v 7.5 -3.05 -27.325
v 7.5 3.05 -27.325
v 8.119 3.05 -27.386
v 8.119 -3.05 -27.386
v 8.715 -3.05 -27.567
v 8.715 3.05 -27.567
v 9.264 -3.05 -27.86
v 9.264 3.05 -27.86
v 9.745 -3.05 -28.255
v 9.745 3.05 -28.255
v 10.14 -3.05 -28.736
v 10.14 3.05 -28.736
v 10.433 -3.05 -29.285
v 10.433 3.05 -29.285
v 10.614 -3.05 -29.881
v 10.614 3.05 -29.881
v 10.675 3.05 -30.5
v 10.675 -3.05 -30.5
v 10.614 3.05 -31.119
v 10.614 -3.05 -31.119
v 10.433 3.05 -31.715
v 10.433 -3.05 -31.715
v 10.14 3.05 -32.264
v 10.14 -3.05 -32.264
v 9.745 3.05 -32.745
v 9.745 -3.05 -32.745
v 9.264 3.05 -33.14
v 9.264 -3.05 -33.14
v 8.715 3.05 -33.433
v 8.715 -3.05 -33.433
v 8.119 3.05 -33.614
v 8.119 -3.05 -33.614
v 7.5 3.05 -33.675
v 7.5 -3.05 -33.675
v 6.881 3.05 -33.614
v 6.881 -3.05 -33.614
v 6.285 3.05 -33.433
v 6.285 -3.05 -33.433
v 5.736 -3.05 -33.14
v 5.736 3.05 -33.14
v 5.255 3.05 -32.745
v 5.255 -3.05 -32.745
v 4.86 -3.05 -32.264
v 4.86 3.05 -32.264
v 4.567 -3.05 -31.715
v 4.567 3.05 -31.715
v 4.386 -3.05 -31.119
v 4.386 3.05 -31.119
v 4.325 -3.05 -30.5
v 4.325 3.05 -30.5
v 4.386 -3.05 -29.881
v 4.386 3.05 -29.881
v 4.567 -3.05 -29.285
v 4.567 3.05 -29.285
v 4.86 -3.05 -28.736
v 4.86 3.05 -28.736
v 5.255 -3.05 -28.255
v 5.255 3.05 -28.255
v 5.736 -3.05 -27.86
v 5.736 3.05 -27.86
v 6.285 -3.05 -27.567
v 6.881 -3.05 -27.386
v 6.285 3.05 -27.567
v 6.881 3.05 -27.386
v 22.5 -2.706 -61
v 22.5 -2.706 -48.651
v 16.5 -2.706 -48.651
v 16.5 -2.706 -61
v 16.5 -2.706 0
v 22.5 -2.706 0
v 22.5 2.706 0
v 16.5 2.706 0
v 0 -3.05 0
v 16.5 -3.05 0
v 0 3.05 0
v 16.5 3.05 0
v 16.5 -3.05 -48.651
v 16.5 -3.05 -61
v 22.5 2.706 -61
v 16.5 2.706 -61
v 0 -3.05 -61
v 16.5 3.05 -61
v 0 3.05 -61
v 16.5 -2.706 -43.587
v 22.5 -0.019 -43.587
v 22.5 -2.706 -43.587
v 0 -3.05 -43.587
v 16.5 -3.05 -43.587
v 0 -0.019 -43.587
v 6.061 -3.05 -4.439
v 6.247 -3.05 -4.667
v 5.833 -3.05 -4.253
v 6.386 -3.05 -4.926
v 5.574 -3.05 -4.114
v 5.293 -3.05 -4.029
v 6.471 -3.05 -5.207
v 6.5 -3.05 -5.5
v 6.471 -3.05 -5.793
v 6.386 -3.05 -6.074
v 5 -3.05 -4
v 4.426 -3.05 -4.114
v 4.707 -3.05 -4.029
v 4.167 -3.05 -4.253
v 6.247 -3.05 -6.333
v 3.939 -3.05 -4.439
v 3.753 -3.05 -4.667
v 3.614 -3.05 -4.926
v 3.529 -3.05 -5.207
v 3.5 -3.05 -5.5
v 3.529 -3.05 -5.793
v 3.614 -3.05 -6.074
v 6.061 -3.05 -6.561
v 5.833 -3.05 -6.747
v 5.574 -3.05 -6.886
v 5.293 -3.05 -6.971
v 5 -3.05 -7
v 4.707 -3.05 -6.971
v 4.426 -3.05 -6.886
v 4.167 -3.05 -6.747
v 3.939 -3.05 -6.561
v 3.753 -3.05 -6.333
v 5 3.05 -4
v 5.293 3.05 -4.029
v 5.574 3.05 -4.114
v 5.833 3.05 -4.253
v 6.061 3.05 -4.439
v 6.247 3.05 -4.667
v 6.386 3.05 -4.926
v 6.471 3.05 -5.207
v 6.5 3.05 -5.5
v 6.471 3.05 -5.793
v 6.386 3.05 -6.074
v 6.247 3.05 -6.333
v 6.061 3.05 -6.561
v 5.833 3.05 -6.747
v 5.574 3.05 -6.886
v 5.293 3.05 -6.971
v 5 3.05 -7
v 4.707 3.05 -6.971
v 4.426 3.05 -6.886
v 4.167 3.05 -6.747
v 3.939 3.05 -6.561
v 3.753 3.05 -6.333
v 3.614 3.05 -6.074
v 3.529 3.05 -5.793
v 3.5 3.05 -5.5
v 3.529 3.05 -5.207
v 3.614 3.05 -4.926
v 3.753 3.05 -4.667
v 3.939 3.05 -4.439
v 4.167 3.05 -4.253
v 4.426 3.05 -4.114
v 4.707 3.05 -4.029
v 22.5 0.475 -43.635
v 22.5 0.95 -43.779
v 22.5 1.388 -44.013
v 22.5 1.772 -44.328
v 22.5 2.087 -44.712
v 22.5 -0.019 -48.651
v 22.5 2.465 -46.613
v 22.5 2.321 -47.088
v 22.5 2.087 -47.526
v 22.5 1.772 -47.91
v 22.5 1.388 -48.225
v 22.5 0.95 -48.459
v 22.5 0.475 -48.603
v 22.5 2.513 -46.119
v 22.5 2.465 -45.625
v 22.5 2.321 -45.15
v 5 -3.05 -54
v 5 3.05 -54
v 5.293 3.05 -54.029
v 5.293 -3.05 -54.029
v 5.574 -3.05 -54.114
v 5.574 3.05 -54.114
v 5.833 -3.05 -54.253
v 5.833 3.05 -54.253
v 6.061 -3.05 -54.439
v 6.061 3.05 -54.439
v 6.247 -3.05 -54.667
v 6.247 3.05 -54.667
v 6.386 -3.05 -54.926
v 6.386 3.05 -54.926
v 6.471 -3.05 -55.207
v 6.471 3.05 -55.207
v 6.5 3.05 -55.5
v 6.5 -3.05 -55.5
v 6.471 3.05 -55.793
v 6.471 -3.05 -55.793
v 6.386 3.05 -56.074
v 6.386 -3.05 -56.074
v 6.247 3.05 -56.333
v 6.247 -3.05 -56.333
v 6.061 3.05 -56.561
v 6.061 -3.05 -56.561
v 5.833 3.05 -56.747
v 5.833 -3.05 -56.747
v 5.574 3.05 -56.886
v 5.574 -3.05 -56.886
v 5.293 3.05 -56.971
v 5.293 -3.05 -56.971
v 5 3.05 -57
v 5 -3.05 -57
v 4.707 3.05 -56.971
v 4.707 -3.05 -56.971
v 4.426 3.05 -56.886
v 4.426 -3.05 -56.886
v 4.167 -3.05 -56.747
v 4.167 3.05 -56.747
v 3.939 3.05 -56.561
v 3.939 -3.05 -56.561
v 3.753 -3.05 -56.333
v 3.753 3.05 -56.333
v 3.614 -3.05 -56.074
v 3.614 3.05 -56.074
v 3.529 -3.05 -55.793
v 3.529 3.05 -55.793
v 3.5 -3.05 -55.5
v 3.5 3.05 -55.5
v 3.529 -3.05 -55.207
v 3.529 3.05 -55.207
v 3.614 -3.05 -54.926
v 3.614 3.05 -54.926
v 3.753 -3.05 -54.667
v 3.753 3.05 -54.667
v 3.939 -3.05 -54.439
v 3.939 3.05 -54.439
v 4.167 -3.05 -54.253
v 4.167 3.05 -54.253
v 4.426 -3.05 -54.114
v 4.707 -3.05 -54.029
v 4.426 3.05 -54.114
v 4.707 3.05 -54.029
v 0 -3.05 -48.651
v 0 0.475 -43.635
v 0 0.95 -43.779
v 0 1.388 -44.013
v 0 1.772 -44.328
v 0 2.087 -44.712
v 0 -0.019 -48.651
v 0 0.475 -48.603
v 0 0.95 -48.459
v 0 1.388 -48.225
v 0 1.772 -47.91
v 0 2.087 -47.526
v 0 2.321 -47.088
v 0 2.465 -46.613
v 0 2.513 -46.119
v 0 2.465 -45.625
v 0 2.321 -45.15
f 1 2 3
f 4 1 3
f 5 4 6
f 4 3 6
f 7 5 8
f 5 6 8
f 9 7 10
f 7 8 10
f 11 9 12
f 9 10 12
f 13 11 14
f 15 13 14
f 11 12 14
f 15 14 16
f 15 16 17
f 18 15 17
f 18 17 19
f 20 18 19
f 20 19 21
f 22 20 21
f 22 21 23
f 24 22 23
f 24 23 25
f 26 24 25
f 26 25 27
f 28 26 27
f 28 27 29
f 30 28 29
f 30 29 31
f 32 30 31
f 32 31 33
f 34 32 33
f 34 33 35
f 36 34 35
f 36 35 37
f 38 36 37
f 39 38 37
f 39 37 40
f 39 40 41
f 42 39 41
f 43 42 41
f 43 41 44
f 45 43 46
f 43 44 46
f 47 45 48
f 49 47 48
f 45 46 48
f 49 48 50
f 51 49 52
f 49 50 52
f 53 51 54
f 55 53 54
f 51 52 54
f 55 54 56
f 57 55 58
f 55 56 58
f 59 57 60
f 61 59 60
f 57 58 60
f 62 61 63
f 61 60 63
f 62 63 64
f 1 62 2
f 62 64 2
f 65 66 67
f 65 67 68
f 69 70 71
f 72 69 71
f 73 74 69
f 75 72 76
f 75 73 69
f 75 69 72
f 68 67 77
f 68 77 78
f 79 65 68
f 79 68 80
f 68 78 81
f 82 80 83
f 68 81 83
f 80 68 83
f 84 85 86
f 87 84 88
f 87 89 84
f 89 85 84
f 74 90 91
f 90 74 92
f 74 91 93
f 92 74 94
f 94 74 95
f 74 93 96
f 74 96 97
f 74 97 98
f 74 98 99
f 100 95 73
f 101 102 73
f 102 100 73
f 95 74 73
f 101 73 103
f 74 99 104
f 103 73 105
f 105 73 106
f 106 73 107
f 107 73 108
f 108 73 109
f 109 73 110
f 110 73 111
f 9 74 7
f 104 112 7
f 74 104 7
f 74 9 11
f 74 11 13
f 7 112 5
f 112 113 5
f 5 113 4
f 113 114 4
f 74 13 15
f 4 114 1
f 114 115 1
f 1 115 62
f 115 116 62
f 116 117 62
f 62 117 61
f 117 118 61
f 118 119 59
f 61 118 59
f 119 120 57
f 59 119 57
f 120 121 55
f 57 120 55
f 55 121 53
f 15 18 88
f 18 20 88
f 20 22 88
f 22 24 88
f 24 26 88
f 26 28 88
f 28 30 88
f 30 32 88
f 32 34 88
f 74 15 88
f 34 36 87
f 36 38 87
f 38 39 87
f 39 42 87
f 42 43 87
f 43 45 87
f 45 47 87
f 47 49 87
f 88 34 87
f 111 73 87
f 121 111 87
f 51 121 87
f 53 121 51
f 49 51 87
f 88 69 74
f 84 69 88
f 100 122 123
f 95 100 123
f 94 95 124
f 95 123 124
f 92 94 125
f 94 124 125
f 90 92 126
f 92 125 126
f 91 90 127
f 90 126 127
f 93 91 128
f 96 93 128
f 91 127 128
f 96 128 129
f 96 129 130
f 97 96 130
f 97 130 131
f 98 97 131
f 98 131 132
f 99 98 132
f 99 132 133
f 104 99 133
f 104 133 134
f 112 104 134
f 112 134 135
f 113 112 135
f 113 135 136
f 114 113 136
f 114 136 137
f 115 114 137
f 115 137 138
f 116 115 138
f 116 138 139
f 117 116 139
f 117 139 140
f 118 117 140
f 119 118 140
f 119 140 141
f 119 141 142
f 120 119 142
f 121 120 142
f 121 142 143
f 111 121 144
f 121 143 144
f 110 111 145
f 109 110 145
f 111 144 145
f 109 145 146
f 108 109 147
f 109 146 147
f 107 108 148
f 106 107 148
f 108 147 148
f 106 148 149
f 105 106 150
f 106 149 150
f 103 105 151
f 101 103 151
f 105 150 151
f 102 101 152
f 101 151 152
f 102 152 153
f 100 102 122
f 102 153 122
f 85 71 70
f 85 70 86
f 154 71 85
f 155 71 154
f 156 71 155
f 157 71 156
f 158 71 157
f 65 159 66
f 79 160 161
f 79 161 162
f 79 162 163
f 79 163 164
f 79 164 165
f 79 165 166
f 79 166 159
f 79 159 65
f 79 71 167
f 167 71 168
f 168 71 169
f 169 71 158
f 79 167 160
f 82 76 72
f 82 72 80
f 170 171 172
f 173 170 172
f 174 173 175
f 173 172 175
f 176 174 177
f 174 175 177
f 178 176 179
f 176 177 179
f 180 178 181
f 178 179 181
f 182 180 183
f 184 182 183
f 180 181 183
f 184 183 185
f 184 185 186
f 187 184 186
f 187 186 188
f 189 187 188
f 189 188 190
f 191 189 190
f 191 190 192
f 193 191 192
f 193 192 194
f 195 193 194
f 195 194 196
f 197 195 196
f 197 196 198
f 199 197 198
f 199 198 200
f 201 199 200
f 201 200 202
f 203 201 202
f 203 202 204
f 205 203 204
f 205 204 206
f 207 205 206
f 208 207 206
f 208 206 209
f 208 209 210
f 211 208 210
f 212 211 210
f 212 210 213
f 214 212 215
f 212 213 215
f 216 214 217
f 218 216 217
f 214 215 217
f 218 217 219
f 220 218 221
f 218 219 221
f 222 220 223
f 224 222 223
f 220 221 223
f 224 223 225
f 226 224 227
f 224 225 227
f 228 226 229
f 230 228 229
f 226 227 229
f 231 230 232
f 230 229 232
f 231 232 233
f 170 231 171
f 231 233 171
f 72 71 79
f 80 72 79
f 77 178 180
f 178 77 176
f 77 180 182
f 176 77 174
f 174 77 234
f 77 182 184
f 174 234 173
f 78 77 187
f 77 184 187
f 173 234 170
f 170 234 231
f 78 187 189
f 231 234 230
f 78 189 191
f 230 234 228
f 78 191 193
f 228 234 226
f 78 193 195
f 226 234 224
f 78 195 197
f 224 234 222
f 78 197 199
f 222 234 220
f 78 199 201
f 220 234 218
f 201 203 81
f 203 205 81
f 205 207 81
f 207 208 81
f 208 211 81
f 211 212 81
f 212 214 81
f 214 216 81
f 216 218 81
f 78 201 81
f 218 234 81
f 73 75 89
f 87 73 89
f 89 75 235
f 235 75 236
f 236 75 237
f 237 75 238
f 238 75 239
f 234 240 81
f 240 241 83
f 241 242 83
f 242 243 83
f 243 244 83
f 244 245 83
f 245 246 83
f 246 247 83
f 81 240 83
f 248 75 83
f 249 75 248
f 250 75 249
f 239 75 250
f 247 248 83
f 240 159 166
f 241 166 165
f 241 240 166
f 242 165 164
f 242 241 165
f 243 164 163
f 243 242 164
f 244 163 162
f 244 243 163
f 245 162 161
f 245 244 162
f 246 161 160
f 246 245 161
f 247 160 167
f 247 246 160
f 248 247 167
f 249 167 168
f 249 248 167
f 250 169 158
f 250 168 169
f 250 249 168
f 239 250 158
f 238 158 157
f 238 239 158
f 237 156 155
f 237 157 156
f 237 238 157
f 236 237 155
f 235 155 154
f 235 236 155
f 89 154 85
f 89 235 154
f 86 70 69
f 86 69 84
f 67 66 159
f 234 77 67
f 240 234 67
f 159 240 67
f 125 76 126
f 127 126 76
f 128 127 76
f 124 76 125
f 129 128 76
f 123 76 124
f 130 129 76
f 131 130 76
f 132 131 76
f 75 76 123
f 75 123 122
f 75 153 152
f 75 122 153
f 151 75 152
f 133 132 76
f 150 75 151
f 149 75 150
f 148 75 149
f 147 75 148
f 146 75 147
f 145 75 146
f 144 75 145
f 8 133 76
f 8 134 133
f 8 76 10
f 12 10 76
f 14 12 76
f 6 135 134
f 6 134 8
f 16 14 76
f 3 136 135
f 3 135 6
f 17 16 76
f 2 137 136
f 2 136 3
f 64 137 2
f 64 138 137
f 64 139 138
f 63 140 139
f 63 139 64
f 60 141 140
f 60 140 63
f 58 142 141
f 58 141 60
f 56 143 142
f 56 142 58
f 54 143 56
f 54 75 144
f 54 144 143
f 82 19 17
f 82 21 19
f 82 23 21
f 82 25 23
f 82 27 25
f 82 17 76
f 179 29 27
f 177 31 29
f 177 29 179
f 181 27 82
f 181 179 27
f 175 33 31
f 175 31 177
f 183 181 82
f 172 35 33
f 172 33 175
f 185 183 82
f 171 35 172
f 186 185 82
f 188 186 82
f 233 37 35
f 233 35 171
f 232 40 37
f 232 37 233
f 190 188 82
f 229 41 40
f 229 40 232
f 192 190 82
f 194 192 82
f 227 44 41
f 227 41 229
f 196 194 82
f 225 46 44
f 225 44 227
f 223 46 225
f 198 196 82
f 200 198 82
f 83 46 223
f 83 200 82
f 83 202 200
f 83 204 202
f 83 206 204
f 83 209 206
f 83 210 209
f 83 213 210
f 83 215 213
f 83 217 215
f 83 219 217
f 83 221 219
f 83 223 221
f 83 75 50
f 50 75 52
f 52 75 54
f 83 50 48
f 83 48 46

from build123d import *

# Parameters (mm, degrees)
SKETCH1_W           = 61
SKETCH1_H           = 6.1
BOSS_EXTRUDE1_DEPTH = 22.5
SKETCH2_OUTSIDE_W   = 76.06
SKETCH2_OUTSIDE_H   = 21.16
SKETCH2_OUTSIDE_W_2 = 61
SKETCH2_OUTSIDE_H_2 = 5.41284
CUT_EXTRUDE1_DEPTH  = 6
CUT_EXTRUDE3_DEPTH  = 23.5
SKETCH6_R           = 3.175
CUT_EXTRUDE4_DEPTH  = 7.1
SKETCH7_R           = 1.5
CUT_EXTRUDE5_DEPTH  = 7.1


with BuildPart() as part:
    # Sketch1 → Boss-Extrude1 (new body)
    with BuildSketch(Plane(origin=(0, 0, 0), x_dir=(0, 0, -1), z_dir=(1, 0, 0))):
        with Locations((30.5, 0)):
            Rectangle(SKETCH1_W, SKETCH1_H)
    extrude(amount=BOSS_EXTRUDE1_DEPTH)

    # Sketch2 outside → Cut-Extrude1 (cut)
    with BuildSketch(Plane(origin=(22.5, 0, 0), x_dir=(0, 0, -1), z_dir=(1, 0, 0))):
        with Locations((30.5, 0)):
            Rectangle(SKETCH2_OUTSIDE_W, SKETCH2_OUTSIDE_H)
        with Locations((30.5, 0)):
            Rectangle(SKETCH2_OUTSIDE_W_2, SKETCH2_OUTSIDE_H_2, mode=Mode.SUBTRACT)
    extrude(amount=-CUT_EXTRUDE1_DEPTH, mode=Mode.SUBTRACT)

    # Sketch5 → Cut-Extrude3 (cut, through all)
    with BuildSketch(Plane.ZY):
        with BuildLine():
            Line((-43.5866, -0.01898), (-43.5866, -3.05))
            Line((-43.5866, -3.05), (-48.6514, -3.05))
            Line((-48.6514, -3.05), (-48.6514, -0.01898))
            ThreePointArc((-48.6514, -0.01898), (-46.119, 2.51342), (-43.5866, -0.01898))
        make_face()
    extrude(amount=-CUT_EXTRUDE3_DEPTH, mode=Mode.SUBTRACT)

    # Sketch6 → Cut-Extrude4 (cut, through all)
    with BuildSketch(Plane(origin=(0, 3.05, 0), x_dir=(1, 0, 0), z_dir=(0, 1, 0))):
        with Locations(Location((7.5, 30.5, 0), (0, 0, 270))):  # turned: the seam where the file's is
            Circle(SKETCH6_R)
    extrude(amount=-CUT_EXTRUDE4_DEPTH, mode=Mode.SUBTRACT)

    # Sketch7 → Cut-Extrude5 (cut, through all)
    with BuildSketch(Plane(origin=(0, 3.05, 0), x_dir=(1, 0, 0), z_dir=(0, 1, 0))):
        with Locations(Location((5, 55.5, 0), (0, 0, 270))):  # turned: the seam where the file's is
            Circle(SKETCH7_R)
        with Locations(Location((5, 5.5, 0), (0, 0, 270))):  # turned: the seam where the file's is
            Circle(SKETCH7_R)
    extrude(amount=-CUT_EXTRUDE5_DEPTH, mode=Mode.SUBTRACT)


solid = part.part
